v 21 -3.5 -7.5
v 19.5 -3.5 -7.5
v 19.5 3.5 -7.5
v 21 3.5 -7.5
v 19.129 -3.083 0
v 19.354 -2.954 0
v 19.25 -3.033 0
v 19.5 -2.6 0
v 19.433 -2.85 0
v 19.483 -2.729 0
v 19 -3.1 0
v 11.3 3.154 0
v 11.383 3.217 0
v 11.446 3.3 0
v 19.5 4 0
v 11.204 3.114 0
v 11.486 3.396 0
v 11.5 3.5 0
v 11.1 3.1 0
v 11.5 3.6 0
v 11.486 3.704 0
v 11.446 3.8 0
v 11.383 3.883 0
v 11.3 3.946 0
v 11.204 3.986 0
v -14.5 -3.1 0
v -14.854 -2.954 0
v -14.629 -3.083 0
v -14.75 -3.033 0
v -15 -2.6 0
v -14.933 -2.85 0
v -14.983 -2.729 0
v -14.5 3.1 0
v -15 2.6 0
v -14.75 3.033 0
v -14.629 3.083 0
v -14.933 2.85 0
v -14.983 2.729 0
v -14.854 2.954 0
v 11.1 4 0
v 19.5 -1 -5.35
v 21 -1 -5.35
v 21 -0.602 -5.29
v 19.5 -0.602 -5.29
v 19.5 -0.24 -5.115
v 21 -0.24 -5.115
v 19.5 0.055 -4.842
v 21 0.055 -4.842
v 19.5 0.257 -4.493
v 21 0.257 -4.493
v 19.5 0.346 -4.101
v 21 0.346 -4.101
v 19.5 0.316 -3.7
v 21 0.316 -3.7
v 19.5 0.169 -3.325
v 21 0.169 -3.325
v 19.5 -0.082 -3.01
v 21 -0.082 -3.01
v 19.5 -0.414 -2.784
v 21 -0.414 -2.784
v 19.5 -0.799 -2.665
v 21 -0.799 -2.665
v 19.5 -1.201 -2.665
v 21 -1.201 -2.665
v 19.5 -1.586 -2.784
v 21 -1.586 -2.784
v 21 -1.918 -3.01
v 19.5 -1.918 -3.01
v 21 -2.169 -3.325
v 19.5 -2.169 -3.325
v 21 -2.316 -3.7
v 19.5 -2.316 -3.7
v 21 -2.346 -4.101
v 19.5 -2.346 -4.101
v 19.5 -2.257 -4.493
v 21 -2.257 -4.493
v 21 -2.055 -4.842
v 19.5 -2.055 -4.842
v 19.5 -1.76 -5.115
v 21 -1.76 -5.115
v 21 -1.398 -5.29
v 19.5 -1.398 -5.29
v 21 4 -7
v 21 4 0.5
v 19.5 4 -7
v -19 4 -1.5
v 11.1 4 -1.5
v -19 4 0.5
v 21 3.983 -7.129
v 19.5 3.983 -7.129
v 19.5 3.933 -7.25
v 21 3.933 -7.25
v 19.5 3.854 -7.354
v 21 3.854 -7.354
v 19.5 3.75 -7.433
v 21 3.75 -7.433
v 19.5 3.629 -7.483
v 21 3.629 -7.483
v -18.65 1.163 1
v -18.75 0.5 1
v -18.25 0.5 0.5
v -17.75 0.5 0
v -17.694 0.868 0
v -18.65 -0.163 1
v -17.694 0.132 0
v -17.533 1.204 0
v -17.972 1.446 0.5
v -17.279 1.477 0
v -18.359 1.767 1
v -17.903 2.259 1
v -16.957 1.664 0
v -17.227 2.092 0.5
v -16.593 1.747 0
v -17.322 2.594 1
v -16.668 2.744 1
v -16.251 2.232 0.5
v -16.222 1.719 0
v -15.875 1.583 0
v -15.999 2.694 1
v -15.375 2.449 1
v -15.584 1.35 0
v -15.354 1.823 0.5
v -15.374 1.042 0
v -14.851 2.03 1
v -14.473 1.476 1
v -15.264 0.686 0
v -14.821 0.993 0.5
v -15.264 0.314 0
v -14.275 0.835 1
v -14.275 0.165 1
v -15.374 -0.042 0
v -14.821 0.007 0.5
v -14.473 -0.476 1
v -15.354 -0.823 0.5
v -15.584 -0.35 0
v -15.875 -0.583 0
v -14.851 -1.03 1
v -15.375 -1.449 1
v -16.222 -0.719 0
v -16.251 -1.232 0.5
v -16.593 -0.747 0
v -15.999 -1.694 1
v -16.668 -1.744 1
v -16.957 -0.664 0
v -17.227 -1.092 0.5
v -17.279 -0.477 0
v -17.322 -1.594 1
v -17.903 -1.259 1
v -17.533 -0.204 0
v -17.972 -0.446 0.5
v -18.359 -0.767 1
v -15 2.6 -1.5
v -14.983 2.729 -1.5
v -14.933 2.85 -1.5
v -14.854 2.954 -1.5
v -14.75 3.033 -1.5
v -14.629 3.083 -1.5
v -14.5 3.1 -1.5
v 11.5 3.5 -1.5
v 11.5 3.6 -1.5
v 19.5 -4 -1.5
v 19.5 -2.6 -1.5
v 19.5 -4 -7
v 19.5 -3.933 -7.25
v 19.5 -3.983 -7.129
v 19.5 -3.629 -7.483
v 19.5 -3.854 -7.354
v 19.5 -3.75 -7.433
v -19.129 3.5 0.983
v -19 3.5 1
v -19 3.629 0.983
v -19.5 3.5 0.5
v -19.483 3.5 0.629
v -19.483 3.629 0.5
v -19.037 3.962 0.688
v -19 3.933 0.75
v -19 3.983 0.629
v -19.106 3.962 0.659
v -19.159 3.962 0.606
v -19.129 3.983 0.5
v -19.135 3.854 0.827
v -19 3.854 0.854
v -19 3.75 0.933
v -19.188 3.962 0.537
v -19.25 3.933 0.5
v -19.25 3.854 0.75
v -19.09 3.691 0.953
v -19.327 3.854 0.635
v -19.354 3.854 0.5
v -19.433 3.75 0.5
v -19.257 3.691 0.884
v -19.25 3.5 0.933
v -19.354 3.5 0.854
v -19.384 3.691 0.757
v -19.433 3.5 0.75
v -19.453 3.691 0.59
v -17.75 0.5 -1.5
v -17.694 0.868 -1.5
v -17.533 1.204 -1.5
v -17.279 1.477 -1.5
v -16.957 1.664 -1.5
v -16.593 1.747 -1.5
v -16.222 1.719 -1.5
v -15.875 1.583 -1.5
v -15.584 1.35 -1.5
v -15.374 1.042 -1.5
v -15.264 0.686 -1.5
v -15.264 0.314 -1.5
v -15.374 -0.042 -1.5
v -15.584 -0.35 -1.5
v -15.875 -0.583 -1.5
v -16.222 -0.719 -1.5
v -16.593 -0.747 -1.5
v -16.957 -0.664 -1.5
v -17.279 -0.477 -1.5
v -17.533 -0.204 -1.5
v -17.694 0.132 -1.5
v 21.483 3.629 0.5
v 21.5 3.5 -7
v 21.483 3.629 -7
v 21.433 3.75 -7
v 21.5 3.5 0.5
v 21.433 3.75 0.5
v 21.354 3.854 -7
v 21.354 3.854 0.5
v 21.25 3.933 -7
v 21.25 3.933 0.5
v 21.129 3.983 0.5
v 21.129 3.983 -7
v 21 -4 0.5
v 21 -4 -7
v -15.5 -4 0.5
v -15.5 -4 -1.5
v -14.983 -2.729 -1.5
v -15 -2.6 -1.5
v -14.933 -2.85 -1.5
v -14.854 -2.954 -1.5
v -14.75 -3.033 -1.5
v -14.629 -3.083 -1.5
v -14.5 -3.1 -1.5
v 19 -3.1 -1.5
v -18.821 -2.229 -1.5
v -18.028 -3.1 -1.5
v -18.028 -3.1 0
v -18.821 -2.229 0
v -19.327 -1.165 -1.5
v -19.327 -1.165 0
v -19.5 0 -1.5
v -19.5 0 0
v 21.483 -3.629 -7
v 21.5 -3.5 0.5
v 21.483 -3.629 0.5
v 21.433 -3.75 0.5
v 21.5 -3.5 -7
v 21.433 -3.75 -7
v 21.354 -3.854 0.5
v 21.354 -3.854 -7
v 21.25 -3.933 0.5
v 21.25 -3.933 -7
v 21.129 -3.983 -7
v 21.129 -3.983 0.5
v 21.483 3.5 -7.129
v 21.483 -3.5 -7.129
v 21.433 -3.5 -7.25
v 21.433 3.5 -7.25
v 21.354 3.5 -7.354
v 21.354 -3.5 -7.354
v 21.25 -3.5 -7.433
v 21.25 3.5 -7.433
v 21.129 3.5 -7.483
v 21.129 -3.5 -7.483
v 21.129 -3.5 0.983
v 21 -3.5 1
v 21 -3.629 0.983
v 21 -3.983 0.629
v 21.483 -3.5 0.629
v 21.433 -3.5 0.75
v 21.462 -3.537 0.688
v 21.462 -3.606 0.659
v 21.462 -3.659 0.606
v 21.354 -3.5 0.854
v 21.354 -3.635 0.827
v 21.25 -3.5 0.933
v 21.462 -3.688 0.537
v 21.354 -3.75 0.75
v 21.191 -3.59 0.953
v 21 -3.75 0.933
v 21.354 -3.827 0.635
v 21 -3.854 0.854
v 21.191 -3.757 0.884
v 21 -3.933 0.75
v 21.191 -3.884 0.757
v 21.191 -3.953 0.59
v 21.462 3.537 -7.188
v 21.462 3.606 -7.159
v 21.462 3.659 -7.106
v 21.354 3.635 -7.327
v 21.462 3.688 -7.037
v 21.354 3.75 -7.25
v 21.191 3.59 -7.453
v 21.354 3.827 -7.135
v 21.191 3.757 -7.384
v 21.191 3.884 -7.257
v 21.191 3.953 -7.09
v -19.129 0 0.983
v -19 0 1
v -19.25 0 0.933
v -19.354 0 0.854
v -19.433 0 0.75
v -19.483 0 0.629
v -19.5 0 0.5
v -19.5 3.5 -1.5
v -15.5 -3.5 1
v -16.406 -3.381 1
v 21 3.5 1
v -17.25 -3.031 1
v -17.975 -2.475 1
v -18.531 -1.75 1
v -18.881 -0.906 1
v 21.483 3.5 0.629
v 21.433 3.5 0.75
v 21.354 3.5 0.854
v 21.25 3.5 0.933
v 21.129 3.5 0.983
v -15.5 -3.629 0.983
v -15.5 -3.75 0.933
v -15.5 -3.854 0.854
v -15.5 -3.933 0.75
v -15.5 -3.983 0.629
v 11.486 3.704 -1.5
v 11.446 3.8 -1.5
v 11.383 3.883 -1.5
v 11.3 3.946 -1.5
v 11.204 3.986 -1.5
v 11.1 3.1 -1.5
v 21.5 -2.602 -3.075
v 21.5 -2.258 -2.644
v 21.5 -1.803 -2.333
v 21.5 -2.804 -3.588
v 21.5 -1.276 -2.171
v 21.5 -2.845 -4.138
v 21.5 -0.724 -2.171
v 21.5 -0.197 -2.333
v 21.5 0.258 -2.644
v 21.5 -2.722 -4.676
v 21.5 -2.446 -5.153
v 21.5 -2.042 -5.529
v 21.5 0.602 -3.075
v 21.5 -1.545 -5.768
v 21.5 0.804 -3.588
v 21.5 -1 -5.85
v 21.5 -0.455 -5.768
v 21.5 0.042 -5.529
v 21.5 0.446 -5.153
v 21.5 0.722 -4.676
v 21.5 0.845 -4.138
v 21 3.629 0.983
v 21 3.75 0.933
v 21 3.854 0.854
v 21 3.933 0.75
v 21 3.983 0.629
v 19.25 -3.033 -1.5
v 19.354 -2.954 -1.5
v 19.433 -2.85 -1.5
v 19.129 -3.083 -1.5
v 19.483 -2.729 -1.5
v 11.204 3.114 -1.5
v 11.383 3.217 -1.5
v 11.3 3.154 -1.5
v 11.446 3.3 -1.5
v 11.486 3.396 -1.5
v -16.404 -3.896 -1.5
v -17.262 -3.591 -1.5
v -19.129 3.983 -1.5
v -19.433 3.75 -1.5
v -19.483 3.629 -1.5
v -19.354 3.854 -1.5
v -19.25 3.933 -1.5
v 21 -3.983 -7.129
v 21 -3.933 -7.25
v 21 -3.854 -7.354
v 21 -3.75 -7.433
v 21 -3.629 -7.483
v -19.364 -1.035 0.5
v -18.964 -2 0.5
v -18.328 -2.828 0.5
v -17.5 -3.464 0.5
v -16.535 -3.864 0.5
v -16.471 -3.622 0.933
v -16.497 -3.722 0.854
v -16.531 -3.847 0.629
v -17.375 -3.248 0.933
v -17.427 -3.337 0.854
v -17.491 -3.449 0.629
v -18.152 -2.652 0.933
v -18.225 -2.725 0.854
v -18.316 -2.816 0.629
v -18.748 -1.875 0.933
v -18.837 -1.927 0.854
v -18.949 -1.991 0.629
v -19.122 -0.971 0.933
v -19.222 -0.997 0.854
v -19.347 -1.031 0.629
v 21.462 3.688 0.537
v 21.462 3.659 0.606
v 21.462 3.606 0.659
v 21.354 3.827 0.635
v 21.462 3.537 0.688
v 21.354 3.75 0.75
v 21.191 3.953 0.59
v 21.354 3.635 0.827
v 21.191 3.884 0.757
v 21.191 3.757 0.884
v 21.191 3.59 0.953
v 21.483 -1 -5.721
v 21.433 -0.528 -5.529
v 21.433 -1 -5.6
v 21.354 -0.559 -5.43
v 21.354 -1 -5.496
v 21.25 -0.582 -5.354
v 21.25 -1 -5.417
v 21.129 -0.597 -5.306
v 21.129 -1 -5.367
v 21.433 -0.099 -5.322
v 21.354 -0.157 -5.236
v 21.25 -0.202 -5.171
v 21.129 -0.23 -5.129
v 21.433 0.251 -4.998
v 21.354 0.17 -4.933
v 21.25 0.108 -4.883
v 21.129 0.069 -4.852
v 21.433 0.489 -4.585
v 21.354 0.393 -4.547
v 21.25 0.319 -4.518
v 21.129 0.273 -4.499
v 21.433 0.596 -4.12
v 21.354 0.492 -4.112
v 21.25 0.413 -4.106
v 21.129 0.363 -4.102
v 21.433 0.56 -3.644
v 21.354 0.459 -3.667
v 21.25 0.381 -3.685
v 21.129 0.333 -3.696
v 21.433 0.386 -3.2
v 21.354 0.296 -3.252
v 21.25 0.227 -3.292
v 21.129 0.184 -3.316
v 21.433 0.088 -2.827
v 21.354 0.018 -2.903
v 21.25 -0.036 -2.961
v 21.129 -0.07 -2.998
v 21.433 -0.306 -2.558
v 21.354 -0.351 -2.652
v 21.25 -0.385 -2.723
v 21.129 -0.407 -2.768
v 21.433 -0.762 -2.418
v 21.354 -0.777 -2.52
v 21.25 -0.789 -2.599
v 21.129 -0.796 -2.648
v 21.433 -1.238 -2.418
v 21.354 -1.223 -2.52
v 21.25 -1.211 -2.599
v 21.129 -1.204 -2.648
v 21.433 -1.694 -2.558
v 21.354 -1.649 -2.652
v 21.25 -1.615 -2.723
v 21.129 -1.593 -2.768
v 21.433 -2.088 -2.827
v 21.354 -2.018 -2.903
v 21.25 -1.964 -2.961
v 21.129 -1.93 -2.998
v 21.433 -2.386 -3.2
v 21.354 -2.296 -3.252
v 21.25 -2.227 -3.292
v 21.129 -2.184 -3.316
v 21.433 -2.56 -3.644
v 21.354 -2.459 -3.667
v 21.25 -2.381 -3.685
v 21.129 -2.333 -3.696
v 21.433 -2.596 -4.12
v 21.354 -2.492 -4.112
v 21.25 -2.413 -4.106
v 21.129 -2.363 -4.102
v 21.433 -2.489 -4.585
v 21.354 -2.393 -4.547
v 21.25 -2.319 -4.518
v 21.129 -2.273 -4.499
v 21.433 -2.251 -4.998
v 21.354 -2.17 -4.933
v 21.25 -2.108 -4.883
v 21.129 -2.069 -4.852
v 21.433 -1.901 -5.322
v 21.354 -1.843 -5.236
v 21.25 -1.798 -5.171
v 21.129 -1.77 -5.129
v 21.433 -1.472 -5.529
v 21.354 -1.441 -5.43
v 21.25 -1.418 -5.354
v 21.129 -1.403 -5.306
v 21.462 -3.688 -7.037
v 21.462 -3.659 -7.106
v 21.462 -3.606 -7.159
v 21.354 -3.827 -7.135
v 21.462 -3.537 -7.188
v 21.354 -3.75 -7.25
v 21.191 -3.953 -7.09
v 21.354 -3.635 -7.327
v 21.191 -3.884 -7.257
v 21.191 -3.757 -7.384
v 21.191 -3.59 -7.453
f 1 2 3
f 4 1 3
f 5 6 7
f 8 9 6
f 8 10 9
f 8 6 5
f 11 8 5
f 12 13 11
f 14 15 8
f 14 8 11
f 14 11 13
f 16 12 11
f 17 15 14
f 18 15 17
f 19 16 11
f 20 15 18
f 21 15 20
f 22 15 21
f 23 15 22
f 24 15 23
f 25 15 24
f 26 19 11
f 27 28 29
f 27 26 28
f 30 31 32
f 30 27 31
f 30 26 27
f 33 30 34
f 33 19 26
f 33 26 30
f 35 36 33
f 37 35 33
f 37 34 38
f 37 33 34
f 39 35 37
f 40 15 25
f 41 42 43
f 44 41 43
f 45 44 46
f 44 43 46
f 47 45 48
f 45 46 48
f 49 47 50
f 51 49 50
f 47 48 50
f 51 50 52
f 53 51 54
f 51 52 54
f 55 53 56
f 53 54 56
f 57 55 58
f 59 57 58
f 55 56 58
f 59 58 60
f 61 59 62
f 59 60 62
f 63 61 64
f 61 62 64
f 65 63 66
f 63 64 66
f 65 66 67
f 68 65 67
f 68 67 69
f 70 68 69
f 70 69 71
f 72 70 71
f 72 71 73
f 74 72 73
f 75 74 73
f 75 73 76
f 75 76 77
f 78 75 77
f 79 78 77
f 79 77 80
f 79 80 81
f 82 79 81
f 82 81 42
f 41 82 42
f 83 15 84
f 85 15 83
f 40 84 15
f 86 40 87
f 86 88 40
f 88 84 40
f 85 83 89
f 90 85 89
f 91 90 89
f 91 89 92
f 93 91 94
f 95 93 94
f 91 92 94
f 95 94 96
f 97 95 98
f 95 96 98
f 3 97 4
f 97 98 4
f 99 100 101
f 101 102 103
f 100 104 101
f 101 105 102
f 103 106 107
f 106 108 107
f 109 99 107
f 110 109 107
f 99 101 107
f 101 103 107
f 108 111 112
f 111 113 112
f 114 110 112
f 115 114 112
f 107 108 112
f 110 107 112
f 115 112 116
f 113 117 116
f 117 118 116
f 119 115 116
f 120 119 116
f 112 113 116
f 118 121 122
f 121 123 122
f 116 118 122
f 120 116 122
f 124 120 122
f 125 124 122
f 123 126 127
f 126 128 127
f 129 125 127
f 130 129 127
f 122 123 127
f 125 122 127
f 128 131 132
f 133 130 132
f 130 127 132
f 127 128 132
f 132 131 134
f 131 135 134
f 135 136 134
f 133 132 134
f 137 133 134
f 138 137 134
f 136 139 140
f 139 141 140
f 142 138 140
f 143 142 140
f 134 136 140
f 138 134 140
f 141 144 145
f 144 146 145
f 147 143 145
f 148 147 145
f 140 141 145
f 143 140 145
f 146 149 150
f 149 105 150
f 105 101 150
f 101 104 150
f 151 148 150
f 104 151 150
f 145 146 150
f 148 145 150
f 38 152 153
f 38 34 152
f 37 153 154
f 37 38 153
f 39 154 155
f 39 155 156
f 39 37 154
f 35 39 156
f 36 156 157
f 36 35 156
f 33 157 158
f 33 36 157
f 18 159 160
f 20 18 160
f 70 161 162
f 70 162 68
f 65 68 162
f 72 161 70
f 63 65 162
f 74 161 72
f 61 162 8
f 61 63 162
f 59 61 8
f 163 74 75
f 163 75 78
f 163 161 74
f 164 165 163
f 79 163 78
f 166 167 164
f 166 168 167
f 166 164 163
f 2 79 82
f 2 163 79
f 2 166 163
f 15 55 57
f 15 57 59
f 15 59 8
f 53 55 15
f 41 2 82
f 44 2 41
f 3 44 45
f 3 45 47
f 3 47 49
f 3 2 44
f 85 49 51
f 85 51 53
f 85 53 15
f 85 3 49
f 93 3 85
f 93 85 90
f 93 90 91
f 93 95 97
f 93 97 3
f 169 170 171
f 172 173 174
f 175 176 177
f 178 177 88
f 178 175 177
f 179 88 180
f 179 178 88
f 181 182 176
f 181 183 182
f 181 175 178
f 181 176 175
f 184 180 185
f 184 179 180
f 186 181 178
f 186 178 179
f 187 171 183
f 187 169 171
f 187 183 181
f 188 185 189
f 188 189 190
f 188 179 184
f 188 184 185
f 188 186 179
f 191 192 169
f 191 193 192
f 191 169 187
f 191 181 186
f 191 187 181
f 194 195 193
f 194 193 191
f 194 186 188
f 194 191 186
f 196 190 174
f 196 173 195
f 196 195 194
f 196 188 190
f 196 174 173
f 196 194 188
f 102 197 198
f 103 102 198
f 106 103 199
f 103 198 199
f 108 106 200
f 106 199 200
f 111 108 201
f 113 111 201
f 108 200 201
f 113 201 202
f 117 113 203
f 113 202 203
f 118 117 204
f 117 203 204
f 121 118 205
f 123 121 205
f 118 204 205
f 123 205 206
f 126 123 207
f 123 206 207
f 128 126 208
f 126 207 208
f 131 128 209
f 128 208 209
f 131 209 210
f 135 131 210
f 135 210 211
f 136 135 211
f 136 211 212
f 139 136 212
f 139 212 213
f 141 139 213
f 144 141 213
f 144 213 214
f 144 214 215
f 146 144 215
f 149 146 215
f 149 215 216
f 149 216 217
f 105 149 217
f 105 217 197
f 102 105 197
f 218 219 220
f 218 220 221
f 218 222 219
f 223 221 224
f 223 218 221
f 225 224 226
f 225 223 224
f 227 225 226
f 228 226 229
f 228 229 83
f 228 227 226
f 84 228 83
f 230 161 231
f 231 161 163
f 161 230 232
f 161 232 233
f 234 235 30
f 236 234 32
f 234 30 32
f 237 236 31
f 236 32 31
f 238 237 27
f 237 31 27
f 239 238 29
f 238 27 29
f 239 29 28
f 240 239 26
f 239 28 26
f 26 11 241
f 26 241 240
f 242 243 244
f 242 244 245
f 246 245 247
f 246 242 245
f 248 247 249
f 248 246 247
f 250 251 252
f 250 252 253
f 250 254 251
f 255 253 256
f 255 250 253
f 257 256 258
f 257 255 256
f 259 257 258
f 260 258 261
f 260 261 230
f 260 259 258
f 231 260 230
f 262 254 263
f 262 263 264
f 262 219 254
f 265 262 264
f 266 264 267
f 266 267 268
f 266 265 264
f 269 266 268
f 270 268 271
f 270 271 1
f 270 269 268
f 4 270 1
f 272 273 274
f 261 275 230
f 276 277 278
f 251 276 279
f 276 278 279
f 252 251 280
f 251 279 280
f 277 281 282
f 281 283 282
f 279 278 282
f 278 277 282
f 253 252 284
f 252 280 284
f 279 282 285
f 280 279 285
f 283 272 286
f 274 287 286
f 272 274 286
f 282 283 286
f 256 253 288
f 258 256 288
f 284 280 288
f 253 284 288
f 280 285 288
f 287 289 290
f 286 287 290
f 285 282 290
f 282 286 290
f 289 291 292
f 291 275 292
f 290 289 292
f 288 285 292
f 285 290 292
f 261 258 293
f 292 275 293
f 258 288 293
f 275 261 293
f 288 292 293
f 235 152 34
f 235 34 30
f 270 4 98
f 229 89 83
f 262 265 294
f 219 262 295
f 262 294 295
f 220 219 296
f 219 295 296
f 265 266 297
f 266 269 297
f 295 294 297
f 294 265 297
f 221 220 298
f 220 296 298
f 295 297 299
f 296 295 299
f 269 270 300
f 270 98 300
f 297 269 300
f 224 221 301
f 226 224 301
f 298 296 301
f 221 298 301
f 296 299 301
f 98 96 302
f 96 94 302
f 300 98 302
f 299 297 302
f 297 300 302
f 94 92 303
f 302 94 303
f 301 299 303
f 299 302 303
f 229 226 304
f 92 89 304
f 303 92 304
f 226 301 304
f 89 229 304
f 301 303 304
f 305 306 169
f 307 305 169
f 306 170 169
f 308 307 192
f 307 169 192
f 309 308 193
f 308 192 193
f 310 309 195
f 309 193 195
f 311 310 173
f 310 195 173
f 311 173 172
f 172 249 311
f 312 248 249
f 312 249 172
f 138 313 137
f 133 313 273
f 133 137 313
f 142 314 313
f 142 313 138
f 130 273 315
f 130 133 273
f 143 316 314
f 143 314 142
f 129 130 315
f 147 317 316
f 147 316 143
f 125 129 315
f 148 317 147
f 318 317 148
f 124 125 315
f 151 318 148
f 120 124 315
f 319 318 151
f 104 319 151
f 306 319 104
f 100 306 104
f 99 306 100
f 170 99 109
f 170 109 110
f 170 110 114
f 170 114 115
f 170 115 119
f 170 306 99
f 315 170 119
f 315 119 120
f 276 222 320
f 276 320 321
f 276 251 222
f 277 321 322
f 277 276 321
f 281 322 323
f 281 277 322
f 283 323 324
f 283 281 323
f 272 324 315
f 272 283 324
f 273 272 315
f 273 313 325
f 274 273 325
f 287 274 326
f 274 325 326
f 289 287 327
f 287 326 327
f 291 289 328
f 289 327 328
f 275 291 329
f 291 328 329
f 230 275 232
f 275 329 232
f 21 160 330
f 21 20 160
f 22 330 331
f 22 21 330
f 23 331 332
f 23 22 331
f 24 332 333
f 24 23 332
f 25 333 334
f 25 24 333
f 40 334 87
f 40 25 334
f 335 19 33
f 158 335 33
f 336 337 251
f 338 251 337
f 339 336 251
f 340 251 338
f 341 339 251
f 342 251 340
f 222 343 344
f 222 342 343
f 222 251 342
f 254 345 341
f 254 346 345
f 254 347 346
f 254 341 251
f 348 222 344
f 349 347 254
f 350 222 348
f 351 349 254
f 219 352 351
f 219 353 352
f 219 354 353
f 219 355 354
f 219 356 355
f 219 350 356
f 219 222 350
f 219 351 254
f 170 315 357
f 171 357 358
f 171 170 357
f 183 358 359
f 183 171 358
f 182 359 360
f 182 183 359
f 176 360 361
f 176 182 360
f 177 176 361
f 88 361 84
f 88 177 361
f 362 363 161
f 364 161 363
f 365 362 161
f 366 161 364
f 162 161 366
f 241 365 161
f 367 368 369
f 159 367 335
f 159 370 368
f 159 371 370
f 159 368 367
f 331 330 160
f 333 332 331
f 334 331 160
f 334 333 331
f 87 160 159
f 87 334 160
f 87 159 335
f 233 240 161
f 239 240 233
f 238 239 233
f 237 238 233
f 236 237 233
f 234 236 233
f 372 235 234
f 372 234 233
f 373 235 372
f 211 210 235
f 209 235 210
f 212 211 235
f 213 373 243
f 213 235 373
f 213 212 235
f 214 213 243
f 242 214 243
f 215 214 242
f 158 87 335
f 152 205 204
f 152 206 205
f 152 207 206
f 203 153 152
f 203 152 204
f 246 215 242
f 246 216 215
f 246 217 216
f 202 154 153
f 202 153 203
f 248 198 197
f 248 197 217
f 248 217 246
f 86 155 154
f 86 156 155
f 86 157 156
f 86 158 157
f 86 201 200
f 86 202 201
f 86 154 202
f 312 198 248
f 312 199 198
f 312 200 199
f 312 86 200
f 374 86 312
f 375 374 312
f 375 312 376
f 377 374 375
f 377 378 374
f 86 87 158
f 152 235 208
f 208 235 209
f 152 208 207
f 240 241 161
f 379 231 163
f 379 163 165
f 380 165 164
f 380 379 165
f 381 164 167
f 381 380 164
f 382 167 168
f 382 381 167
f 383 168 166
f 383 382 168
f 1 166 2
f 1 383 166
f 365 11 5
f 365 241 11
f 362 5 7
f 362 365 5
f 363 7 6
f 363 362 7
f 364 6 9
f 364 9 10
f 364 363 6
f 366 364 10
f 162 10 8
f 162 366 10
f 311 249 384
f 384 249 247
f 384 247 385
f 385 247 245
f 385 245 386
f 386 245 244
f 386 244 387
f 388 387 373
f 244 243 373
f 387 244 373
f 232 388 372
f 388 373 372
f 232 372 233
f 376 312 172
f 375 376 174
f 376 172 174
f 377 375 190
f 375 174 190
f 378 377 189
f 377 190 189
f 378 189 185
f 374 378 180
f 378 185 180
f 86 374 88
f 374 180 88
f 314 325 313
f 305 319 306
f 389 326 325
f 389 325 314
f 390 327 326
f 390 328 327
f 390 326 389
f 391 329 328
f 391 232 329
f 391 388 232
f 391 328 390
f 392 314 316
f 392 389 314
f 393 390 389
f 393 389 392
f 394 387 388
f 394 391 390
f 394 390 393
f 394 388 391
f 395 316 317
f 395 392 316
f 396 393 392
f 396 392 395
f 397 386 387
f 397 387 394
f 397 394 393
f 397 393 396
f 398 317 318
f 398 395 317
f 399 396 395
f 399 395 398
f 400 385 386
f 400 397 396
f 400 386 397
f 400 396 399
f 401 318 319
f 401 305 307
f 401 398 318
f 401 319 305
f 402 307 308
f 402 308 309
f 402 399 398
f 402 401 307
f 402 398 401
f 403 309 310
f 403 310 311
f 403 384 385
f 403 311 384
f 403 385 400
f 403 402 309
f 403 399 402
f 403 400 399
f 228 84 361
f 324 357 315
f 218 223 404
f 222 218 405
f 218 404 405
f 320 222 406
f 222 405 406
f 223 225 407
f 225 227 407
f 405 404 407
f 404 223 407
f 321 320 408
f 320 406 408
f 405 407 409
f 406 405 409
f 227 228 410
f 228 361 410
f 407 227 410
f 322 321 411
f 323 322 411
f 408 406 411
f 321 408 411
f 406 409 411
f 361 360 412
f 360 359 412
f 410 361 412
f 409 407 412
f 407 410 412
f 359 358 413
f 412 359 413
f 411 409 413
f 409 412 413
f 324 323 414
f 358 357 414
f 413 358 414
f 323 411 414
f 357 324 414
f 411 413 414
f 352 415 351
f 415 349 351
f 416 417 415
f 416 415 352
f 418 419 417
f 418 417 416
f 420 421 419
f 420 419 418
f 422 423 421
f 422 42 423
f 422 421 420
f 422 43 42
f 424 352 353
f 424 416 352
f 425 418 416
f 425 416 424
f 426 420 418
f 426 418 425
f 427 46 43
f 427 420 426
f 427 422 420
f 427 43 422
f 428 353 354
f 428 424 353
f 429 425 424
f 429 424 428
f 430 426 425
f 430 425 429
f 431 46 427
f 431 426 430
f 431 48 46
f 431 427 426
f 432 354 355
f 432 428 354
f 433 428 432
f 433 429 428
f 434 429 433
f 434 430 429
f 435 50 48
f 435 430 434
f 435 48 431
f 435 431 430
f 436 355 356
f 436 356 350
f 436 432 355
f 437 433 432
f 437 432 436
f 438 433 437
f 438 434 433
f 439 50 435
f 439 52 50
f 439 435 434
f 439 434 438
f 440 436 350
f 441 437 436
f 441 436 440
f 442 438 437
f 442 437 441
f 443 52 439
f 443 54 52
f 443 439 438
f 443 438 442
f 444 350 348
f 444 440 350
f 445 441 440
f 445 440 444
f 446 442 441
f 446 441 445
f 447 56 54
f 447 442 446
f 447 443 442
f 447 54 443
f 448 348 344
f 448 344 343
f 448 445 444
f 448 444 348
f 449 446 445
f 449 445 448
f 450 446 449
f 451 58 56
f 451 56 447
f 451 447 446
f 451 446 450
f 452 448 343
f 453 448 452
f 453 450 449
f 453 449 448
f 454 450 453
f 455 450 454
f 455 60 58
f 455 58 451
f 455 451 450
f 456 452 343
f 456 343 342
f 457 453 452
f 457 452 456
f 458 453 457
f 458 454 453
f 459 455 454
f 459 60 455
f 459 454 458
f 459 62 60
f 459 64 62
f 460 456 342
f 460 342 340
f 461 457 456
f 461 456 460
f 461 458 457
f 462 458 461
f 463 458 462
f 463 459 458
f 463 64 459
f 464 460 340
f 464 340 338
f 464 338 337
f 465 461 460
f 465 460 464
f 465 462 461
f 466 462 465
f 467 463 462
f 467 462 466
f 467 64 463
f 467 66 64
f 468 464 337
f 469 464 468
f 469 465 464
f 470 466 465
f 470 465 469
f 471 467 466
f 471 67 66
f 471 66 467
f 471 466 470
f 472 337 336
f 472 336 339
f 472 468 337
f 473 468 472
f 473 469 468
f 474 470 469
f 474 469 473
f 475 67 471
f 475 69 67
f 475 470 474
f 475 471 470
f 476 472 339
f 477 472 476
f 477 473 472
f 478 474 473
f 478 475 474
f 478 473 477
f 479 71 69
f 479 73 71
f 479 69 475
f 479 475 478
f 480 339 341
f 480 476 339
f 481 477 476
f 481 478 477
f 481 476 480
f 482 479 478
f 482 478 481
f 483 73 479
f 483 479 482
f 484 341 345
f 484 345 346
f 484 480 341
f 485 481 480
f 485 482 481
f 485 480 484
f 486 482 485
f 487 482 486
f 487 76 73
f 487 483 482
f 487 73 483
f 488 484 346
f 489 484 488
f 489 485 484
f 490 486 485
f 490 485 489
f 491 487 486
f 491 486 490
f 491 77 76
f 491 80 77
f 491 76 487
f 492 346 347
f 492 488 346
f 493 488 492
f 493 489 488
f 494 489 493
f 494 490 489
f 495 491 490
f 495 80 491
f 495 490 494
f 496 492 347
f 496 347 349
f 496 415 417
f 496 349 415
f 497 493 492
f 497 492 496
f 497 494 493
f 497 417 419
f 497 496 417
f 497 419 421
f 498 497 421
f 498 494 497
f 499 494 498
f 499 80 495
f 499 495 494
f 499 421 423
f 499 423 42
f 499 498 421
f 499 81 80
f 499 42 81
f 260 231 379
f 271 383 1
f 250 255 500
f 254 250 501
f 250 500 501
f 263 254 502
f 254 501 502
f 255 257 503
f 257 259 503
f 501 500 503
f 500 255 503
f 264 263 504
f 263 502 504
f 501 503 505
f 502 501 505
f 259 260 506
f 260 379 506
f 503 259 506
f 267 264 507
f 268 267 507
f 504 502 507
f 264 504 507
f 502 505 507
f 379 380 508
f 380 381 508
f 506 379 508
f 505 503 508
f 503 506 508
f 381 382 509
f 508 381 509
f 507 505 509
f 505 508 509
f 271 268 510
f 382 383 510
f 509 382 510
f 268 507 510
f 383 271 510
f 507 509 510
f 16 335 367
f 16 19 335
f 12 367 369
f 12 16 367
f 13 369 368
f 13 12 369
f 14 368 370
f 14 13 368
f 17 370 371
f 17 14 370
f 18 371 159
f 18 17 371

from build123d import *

# Parameters (mm, degrees)
SKETCH_1_W                = 39
SKETCH_1_H                = 8
EXTRUDE_1_DEPTH           = 1
SKETCH_3_W                = 39
SKETCH_3_H                = 0.9
EXTRUDE_3_DEPTH           = 1.5
SKETCH_4_W                = 39
SKETCH_4_H                = 0.9
EXTRUDE_4_DEPTH           = 1.5
FILLET_1_R                = 4
SKETCH_5_W                = 8.5
SKETCH_5_H                = 8
EXTRUDE_5_DEPTH           = 2
SKETCH_6_W                = 8
SKETCH_6_H                = 0.9
CUT_EXTRUDE_1_DEPTH       = 1.5
FILLET_2_R                = 0.5
SKETCH_8_R                = 1.35
CUT_EXTRUDE_2_DEPTH       = 3
FILLET_3_R                = 0.5
SKETCH_9_R                = 1.1
CUT_EXTRUDE_3_DEPTH       = 3
HOLE_WIZARD_1_D           = 2.2
HOLE_WIZARD_1_DEPTH       = 7
HOLE_WIZARD_1_CSINK_D     = 4.5
HOLE_WIZARD_1_CSINK_ANGLE = 90
HOLE_WIZARD_1_TIP         = 0.660946681
EXTRUDE_6_REACH           = 24.677
SKETCH_11_R               = 1.25
FILLET_4_R                = 0.5
FILLET_5_R                = 0.5
FILLET_6_R                = 0.4
FILLET_7_R                = 0.5


with BuildPart() as part:
    # 草图1 → 凸台-拉伸1 (new body)
    with BuildSketch(Plane.XY):
        Rectangle(SKETCH_1_W, SKETCH_1_H)
    extrude(amount=EXTRUDE_1_DEPTH)

    # 草图3 → 凸台-拉伸3 (add)
    with BuildSketch(Plane(origin=(0, 0, 0), x_dir=(-1, 0, 0), z_dir=(0, 0, -1))):
        with Locations((0, -3.55)):
            Rectangle(SKETCH_3_W, SKETCH_3_H)
    extrude(amount=EXTRUDE_3_DEPTH)

    # 草图4 → 凸台-拉伸4 (add)
    with BuildSketch(Plane(origin=(0, 0, 0), x_dir=(-1, 0, 0), z_dir=(0, 0, -1))):
        with Locations((0, 3.55)):
            Rectangle(SKETCH_4_W, SKETCH_4_H)
    extrude(amount=EXTRUDE_4_DEPTH)

    # 圆角1
    fillet_1_edges = [part.edges().sort_by_distance(p)[0] for p in [
        (-19.5, -4, -0.25),
    ]]
    fillet(fillet_1_edges, radius=FILLET_1_R)

    # 草图5 → 凸台-拉伸5 (add)
    with BuildSketch(Plane(origin=(19.5, 0, 0), x_dir=(0, 0, -1), z_dir=(1, 0, 0))):
        with Locations((3.25, 0)):
            Rectangle(SKETCH_5_W, SKETCH_5_H)
    extrude(amount=EXTRUDE_5_DEPTH)

    # 草图6 → 切除-拉伸1 (cut)
    with BuildSketch(Plane(origin=(0, 0, -1.5), x_dir=(-1, 0, 0), z_dir=(0, 0, -1))):
        with Locations((-15.5, 3.55)):
            Rectangle(SKETCH_6_W, SKETCH_6_H)
    extrude(amount=-CUT_EXTRUDE_1_DEPTH, mode=Mode.SUBTRACT)

    # 圆角2
    fillet_2_edges = [part.edges().sort_by_distance(p)[0] for p in [
        (-19.5, 2, 1),
        (-18.328427125, -2.828427125, 1),
        (1, 4, 1),
        (3, -4, 1),
        (-19.5, 4, -0.25),
    ]]
    fillet(fillet_2_edges, radius=FILLET_2_R)

    # 草图8 → 切除-拉伸2 (cut)
    with BuildSketch(Plane(origin=(21.5, 0, 0), x_dir=(0, 0, -1), z_dir=(1, 0, 0))):
        with Locations((4, -1)):
            Circle(SKETCH_8_R)
    extrude(amount=-CUT_EXTRUDE_2_DEPTH, mode=Mode.SUBTRACT)

    # 圆角3
    fillet_3_edges = [part.edges().sort_by_distance(p)[0] for p in [
        (20.5, -4, -7.5),
        (20.5, 4, -7.5),
    ]]
    fillet(fillet_3_edges, radius=FILLET_3_R)

    # 草图9 → 切除-拉伸3 (cut)
    with BuildSketch(Plane(origin=(0, 0, 0), x_dir=(-1, 0, 0), z_dir=(0, 0, -1))):
        with Locations((16.5, 0.5)):
            Circle(SKETCH_9_R)
    extrude(amount=-CUT_EXTRUDE_3_DEPTH, mode=Mode.SUBTRACT)

    # 打孔尺寸(%根据)开槽沉头木螺钉的类型1
    with Locations(Plane(origin=(-16.5, 0.5, 1), x_dir=(1, 0, 0), z_dir=(0, 0, 1))):
        with Locations((0, 0)):
            CounterSinkHole(HOLE_WIZARD_1_D / 2, HOLE_WIZARD_1_CSINK_D / 2, depth=HOLE_WIZARD_1_DEPTH, counter_sink_angle=HOLE_WIZARD_1_CSINK_ANGLE)
            with Locations((0, 0, -(HOLE_WIZARD_1_DEPTH + HOLE_WIZARD_1_TIP / 2))):  # 118° drill point
                Cone(0, HOLE_WIZARD_1_D / 2, HOLE_WIZARD_1_TIP, mode=Mode.SUBTRACT)

    # 凸台-拉伸6: up to this face of the body (flat: up to its plane)
    extrude_6_end = Plane(part.part.faces().sort_by_distance((0.902646765, 0.108678474, 0))[0])
    # 草图11 → 凸台-拉伸6 (add, up to the picked face)
    with BuildSketch(Plane(origin=(0, 0, -1.5), x_dir=(-1, 0, 0), z_dir=(0, 0, -1)), mode=Mode.PRIVATE) as extrude_6_sk1:
        with BuildLine():
            Line((15, 3.1), (15, -3.1))
            Line((15, -3.1), (18.027844932, -3.1))
            ThreePointArc((18.027844932, -3.1), (19.113265817, -1.715899221), (19.5, 0))
            Line((19.5, 0), (19.5, 3.1))
            Line((19.5, 3.1), (15, 3.1))
        make_face()
        with Locations((16.5, 0.5)):
            Circle(SKETCH_11_R, mode=Mode.SUBTRACT)
    extrude_6_tool1 = split(extrude(extrude_6_sk1.sketch, amount=-EXTRUDE_6_REACH, mode=Mode.PRIVATE), bisect_by=extrude_6_end, keep=Keep.BOTH, mode=Mode.PRIVATE)
    add(extrude_6_tool1.solids().sort_by(Axis((-19.423391, 1.55, -1.5), (0, 0, 1)))[0])

    # 圆角4
    fillet_4_edges = [part.edges().sort_by_distance(p)[0] for p in [
        (-15, -3.1, -0.75),
        (-15, 3.1, -0.75),
    ]]
    fillet(fillet_4_edges, radius=FILLET_4_R)

    # 圆角5
    fillet_5_edges = [part.edges().sort_by_distance(p)[0] for p in [
        (19.5, -3.1, -0.75),
    ]]
    fillet(fillet_5_edges, radius=FILLET_5_R)

    # 圆角6
    fillet_6_edges = [part.edges().sort_by_distance(p)[0] for p in [
        (11.5, 3.1, -0.75),
        (11.5, 4, -0.75),
    ]]
    fillet(fillet_6_edges, radius=FILLET_6_R)

    # 圆角7
    fillet_7_edges = [part.edges().sort_by_distance(p)[0] for p in [
        (21.5, -1, -2.65),
        (21.5, 0, -7.5),
        (21.5, -3.853553391, -7.353553391),
        (21.5, 3.853553391, -7.353553391),
        (21.5, 0, 1),
        (21.5, 4, -3.25),
        (21.5, -4, -3.25),
        (21.5, -3.853553391, 0.853553391),
        (21.5, 3.853553391, 0.853553391),
    ]]
    fillet(fillet_7_edges, radius=FILLET_7_R)


solid = part.part
